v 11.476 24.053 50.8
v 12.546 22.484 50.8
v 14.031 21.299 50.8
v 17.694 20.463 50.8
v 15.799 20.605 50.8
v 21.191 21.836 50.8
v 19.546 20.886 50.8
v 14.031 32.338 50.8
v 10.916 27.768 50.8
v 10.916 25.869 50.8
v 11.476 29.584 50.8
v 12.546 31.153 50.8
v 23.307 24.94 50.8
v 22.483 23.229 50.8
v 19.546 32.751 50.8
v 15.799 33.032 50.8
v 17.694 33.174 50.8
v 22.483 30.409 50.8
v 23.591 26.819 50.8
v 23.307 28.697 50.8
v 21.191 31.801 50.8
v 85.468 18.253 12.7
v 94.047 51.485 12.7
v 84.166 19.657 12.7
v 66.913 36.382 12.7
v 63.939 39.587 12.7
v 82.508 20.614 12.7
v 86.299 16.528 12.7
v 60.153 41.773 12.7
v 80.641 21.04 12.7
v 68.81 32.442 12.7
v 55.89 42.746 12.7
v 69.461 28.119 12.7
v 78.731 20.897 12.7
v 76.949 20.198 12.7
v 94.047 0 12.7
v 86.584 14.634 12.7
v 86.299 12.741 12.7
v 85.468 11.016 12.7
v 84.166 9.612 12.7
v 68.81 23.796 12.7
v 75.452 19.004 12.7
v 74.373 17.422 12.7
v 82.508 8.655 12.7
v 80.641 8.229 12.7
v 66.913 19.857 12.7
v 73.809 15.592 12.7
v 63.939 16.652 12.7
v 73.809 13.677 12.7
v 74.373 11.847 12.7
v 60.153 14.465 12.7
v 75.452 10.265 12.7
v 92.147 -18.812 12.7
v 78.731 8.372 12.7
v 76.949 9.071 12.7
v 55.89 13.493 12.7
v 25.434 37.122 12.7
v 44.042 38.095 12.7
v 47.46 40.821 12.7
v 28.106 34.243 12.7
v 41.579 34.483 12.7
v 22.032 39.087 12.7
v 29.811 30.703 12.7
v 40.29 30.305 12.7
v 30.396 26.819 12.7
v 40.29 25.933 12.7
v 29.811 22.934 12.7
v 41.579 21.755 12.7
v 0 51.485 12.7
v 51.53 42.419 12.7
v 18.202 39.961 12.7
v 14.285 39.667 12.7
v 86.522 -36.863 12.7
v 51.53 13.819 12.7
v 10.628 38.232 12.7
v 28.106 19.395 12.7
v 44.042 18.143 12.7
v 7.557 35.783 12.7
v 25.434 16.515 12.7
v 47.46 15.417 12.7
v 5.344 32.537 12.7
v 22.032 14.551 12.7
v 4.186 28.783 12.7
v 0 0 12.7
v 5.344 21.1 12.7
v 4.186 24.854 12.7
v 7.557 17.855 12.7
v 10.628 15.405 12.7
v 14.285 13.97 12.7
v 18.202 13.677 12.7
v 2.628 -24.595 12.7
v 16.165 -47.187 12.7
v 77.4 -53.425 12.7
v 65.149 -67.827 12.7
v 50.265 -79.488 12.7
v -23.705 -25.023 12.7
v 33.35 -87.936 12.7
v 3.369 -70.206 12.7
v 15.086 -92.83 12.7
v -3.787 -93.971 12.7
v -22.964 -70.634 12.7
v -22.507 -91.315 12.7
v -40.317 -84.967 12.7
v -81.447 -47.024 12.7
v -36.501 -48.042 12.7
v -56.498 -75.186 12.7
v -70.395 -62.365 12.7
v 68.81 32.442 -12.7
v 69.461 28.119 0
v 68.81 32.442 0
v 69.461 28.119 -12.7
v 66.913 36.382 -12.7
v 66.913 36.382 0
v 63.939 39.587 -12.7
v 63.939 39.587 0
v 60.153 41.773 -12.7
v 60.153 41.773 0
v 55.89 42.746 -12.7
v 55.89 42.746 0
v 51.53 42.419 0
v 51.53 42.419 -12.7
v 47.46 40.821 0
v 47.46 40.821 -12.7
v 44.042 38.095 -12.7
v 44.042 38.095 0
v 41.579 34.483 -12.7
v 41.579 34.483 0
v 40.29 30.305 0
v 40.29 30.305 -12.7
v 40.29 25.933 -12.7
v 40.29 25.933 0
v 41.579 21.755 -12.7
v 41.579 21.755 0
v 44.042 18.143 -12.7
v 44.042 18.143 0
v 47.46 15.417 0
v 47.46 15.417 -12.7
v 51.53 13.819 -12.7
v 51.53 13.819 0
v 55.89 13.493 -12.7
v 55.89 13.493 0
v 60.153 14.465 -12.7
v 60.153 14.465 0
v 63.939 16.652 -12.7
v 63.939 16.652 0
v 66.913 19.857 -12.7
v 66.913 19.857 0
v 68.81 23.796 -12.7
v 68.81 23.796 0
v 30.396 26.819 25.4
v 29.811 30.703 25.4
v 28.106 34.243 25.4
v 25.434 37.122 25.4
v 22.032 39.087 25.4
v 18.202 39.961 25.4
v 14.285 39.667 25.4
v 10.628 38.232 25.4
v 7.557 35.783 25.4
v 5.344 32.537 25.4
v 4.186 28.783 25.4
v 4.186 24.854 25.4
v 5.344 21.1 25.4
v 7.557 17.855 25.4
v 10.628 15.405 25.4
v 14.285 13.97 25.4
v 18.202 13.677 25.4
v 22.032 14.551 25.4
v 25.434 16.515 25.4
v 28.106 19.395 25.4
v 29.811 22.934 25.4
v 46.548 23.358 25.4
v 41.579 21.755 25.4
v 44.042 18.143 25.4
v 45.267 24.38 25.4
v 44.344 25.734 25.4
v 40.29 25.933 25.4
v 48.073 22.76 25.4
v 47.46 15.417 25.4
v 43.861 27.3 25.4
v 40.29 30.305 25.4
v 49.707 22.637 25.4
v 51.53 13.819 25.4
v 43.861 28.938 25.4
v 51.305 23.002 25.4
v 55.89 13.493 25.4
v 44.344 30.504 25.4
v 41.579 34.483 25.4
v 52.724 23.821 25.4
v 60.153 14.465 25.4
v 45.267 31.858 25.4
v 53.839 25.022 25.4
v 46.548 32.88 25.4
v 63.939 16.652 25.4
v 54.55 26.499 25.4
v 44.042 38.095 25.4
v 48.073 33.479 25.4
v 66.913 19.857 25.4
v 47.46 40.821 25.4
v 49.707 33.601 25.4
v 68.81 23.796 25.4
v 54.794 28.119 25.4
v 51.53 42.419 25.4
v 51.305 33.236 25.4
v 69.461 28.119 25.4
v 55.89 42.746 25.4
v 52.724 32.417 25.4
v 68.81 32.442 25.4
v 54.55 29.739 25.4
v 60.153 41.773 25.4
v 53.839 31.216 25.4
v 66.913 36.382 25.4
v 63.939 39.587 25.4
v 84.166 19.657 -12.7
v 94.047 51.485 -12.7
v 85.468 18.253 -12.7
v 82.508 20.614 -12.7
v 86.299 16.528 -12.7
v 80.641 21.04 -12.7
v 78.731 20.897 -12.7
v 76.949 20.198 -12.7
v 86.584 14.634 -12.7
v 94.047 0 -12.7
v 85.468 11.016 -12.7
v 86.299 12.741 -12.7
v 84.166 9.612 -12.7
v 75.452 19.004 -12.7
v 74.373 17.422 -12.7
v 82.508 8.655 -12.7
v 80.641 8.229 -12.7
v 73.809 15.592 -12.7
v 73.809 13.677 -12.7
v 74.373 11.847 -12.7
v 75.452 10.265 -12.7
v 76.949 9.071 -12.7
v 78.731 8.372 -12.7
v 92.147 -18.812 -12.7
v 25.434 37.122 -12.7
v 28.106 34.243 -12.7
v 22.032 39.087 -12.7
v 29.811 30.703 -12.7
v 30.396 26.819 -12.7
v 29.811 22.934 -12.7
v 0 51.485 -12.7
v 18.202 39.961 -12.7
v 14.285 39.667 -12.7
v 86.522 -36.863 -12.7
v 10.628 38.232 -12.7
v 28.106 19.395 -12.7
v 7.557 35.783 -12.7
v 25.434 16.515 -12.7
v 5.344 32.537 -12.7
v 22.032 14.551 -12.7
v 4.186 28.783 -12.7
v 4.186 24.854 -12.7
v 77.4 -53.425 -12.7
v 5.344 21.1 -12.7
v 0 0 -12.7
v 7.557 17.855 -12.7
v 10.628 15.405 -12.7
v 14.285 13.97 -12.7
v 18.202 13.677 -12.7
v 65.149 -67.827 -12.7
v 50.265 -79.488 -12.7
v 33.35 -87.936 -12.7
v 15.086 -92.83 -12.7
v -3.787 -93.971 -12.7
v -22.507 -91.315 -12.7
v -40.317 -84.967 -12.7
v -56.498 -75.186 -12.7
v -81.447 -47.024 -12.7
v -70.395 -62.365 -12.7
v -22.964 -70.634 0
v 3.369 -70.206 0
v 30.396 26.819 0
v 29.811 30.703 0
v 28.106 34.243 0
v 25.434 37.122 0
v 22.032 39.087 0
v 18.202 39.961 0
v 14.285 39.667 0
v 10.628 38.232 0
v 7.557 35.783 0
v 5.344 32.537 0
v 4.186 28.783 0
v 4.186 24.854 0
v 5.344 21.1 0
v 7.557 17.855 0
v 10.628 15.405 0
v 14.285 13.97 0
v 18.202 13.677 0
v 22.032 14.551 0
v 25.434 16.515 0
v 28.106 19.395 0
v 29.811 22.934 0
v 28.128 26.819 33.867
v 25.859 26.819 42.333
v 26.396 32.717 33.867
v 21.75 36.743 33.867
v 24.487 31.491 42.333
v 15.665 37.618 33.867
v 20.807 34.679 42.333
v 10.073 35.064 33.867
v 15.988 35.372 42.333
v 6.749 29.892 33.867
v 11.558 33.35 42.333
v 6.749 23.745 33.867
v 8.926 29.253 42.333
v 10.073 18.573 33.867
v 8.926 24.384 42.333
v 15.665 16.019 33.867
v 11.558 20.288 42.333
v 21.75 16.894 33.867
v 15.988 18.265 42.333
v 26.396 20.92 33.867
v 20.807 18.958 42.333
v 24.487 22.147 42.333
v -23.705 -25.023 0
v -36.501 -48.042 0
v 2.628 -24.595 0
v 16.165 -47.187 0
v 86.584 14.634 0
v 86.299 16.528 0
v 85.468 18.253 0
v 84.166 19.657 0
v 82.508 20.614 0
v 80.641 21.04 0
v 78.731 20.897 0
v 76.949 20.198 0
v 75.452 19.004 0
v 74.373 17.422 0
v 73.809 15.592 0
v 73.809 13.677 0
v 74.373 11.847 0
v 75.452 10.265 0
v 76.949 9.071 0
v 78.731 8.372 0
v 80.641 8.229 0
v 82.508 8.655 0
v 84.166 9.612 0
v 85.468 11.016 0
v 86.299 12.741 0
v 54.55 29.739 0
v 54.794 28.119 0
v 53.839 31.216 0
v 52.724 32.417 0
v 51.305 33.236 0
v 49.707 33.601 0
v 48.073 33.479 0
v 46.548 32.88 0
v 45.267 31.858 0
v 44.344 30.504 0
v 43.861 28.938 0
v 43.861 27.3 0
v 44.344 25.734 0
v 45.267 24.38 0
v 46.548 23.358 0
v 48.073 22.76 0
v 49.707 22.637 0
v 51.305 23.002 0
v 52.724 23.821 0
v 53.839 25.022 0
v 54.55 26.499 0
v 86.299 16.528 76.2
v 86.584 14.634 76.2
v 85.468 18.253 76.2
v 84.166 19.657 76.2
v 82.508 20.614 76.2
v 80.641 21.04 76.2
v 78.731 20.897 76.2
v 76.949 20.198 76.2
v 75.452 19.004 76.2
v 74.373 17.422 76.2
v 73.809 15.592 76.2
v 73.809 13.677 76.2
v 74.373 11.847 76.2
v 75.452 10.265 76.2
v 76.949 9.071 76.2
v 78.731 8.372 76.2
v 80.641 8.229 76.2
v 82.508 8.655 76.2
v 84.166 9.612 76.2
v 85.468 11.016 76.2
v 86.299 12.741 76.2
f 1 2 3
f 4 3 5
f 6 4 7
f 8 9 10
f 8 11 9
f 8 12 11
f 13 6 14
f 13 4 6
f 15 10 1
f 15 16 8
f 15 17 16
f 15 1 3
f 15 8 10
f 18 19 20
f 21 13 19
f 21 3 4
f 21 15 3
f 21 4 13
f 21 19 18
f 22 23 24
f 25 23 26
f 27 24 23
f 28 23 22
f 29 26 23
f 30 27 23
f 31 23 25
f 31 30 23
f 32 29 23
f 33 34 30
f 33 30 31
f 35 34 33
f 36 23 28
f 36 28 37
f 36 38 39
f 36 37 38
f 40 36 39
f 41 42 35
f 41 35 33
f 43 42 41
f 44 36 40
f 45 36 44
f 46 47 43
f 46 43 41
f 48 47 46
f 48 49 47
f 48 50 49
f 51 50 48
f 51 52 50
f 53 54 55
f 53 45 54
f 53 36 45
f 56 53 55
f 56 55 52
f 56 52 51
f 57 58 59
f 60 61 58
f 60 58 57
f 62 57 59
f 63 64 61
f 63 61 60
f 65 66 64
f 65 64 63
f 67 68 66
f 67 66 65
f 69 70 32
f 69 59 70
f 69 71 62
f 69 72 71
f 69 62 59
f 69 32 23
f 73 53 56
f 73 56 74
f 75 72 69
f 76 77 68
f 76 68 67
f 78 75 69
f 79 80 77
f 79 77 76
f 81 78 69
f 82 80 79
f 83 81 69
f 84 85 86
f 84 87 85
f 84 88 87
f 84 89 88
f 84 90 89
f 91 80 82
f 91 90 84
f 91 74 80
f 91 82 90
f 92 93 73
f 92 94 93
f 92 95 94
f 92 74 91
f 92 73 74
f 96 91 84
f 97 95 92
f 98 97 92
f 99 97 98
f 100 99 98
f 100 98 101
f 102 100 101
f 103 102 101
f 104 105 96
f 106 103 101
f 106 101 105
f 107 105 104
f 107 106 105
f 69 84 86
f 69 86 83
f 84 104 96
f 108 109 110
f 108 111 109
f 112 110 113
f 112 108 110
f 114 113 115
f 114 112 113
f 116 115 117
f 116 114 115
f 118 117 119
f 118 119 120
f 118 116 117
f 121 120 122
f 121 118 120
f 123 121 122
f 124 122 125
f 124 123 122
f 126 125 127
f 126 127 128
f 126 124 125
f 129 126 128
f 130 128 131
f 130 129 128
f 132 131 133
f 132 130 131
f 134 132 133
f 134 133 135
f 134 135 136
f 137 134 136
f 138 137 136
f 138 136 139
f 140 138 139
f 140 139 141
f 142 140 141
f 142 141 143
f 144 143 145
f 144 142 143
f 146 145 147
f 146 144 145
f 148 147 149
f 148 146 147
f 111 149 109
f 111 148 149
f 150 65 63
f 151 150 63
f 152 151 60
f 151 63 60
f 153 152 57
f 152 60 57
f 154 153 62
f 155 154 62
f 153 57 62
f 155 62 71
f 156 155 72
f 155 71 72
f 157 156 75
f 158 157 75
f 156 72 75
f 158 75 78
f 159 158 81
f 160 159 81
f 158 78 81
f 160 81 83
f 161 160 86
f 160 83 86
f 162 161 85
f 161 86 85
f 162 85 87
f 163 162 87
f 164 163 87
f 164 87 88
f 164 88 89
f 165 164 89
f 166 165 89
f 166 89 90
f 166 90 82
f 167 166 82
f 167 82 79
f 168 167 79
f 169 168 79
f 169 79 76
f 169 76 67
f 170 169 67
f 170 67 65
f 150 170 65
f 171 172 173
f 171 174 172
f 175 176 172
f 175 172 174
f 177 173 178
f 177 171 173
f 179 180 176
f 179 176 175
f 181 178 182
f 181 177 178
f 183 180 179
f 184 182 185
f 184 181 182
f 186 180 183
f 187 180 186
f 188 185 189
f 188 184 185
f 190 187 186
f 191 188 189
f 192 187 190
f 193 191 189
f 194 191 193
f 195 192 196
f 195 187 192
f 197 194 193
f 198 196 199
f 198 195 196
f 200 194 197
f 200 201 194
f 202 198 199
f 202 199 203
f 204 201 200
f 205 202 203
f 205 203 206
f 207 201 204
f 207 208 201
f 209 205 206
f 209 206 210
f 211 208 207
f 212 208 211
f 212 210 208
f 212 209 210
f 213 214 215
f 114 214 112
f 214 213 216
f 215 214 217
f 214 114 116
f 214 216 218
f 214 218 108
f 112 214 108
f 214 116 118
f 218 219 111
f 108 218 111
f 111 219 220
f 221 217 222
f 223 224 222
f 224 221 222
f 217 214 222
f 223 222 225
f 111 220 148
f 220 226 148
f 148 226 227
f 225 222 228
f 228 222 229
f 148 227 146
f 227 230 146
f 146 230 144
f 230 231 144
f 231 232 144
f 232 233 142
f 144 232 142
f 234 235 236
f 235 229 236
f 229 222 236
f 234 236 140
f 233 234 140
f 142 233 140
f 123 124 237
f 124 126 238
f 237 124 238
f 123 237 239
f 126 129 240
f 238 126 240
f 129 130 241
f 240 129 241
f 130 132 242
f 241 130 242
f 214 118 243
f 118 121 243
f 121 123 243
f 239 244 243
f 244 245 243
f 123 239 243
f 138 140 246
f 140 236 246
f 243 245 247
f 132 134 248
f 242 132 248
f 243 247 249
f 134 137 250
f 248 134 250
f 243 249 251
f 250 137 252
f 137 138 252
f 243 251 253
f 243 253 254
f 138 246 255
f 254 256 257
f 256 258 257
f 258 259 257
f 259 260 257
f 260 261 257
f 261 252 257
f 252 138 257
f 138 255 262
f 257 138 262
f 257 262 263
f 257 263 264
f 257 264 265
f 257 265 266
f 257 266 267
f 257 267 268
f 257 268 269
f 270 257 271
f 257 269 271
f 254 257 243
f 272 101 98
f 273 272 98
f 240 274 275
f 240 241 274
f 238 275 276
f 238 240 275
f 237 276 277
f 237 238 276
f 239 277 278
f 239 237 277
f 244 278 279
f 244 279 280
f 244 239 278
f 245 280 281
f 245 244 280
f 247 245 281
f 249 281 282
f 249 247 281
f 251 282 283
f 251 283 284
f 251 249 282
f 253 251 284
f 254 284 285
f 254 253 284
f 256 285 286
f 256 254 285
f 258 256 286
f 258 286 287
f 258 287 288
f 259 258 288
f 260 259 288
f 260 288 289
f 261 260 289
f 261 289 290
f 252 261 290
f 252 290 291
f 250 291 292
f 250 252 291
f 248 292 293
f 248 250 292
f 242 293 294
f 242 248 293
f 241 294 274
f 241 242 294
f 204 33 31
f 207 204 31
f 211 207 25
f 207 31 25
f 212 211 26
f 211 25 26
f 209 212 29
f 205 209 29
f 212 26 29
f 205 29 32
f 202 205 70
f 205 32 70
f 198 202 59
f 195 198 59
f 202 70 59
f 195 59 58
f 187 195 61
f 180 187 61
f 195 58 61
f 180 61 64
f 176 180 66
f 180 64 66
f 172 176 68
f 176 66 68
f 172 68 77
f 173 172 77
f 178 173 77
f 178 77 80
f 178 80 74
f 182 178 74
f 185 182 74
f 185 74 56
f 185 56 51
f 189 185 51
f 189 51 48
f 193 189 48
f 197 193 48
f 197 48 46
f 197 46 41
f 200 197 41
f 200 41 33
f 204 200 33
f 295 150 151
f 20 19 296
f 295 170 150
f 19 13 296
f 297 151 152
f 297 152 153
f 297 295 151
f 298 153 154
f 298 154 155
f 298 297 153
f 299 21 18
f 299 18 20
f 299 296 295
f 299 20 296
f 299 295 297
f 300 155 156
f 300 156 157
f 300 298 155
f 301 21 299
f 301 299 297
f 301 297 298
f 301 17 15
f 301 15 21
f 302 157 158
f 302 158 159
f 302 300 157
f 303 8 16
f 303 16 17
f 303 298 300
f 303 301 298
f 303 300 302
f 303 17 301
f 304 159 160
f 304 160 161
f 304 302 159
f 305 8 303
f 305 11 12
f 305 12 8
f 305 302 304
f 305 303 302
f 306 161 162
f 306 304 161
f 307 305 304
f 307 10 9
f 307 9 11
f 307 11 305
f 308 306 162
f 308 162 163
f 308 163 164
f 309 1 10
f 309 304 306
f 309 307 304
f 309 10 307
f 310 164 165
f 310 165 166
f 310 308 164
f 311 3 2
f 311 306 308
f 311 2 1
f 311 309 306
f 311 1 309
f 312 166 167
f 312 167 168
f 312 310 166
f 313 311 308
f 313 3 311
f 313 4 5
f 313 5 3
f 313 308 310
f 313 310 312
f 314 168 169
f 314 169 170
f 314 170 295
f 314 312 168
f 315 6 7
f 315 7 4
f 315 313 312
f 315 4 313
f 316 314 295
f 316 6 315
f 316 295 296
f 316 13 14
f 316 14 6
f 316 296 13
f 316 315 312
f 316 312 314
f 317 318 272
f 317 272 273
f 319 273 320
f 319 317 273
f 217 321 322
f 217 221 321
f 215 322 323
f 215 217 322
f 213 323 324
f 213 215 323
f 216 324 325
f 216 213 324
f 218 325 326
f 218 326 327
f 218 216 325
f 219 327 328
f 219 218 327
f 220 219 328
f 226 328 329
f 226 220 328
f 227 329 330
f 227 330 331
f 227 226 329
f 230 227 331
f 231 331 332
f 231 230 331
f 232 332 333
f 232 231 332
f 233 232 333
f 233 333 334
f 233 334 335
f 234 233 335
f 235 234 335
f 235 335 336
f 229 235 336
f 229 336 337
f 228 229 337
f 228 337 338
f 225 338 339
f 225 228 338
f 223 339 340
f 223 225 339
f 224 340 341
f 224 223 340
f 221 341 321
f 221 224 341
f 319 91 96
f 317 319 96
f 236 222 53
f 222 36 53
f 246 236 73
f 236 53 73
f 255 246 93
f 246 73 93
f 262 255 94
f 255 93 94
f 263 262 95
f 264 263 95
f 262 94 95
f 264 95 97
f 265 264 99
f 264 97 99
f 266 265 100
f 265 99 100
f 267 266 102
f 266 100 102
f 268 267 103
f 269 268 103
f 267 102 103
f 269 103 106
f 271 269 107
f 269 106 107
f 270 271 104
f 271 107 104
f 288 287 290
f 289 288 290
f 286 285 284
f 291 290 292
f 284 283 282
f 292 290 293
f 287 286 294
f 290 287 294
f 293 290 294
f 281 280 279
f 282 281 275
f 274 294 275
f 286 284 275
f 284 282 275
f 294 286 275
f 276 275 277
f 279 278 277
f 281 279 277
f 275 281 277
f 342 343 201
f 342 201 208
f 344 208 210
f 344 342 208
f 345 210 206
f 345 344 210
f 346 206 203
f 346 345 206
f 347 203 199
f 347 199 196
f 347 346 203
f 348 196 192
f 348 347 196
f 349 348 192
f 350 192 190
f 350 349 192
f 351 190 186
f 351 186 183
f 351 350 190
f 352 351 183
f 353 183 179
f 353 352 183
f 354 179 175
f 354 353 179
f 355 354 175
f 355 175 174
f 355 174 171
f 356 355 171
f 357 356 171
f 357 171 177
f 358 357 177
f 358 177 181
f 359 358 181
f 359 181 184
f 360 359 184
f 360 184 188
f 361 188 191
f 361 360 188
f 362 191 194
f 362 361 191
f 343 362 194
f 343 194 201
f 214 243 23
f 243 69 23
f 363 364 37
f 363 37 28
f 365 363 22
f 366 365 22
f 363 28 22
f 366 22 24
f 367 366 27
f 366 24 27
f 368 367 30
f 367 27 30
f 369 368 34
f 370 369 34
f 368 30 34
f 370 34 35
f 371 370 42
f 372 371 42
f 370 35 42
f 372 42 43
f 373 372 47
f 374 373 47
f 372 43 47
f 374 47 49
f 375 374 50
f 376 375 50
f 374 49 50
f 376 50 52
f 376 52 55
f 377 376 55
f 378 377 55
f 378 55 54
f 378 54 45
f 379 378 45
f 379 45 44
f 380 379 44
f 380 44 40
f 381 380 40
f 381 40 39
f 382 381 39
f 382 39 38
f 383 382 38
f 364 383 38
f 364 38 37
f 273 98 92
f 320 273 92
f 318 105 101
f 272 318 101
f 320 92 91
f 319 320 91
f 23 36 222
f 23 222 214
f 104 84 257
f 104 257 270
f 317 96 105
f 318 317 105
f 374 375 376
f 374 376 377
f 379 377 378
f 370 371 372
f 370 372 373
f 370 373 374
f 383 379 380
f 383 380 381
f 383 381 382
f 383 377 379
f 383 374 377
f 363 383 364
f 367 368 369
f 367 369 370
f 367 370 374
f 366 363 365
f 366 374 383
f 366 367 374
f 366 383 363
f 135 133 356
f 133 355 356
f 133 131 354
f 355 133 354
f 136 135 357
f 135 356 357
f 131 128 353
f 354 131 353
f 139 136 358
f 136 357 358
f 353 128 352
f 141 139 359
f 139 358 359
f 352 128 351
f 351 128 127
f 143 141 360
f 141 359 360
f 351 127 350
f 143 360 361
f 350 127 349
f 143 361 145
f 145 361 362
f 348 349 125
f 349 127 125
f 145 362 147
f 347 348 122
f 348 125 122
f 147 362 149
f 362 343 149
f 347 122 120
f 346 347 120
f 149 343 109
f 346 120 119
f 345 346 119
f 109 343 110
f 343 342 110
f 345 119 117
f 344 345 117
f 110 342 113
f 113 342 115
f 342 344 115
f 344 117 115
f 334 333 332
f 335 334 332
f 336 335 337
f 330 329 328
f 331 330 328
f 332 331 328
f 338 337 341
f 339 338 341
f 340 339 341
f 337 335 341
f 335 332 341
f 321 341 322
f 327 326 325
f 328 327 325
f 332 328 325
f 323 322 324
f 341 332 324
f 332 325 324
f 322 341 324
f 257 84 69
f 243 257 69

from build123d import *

# Parameters (mm, degrees)
F0_R      = 13.1789496922
F1_DEPTH  = 25.4
F0_R_2    = 14.6674866232
F0_R_3    = 5.4973214865
F0_W      = 94.0474122763
F0_H      = 51.4852851629
F0_R_4    = 6.4238066615
F2_DEPTH  = 12.7
F3_DEPTH  = 76.2
F1_FACE_R = 13.1789496922
F4_DEPTH  = 25.4
F4_TAPER  = 15
F2_FACE_W = 94.0474122763
F2_FACE_H = 25.4
F5_ANGLE  = 150
F7_DEPTH  = 12.7


with BuildPart() as f1:
    # F0 (on Top) → F1 (new body)
    with BuildSketch(Plane.XY):
        with Locations((17.2175206244, 26.8186014146)):
            Circle(F0_R)
    extrude(amount=F1_DEPTH)



with BuildPart() as f1b:
    # F0 (on Top) → F1, piece 2 (new body)
    with BuildSketch(Plane.XY):
        with Locations((54.7939687967, 28.1190406531)):
            Circle(F0_R_2)
        with Locations((49.2966473103, 28.1190406531)):
            Circle(F0_R_3, mode=Mode.SUBTRACT)
    extrude(amount=F1_DEPTH)


with BuildPart() as f1_1:
    add(f1.part)

    add(f1b.part)  # F2 merges F1b
    # F0 (on Top) → F2 (join, symmetric)
    with BuildSketch(Plane.XY):
        with Locations((47.0237061381, 25.7426425815)):
            Rectangle(F0_W, F0_H)
        with Locations((80.1606476307, 14.6344061941)):
            Circle(F0_R_4, mode=Mode.SUBTRACT)
        with Locations((17.2175206244, 26.8186014146)):
            Circle(F0_R, mode=Mode.SUBTRACT)
        with Locations((54.7939687967, 28.1190406531)):
            Circle(F0_R_2, mode=Mode.SUBTRACT)
    extrude(amount=F2_DEPTH, both=True)

    # F0 (on Top) → F3 (join)
    with BuildSketch(Plane.XY):
        with Locations((80.1606476307, 14.6344061941)):
            Circle(F0_R_4)
    extrude(amount=F3_DEPTH)

    # F1_face (on face) → F4 (join)
    with BuildSketch(Plane(origin=(17.2175206244, 26.8186014146, 25.4), x_dir=(1, 0, 0), z_dir=(0, 0, 1))):
        Circle(F1_FACE_R)
    extrude(amount=F4_DEPTH, taper=F4_TAPER)

    # F2_face (on face) → F5 (revolve)
    with BuildSketch(Plane(origin=(47.0237061381, 0, 0), x_dir=(1, 0, 0), z_dir=(0, -1, 0))):
        Rectangle(F2_FACE_W, F2_FACE_H)
    revolve(axis=Axis((0, 0, 0), (0, 0, -1)), revolution_arc=F5_ANGLE)

    # F6 (on face) → F7 (cut)
    with BuildSketch(Plane.XY.offset(12.7)):
        Polygon((16.165189955, -47.1866849835), (2.6281359163, -24.5952483242), (-23.705149158, -25.0229626845), (-36.5013801936, -48.042113704), (-22.9643261549, -70.6335503633), (3.3689589194, -70.205836003), align=None)
    extrude(amount=-F7_DEPTH, mode=Mode.SUBTRACT)


solid = f1_1.part
